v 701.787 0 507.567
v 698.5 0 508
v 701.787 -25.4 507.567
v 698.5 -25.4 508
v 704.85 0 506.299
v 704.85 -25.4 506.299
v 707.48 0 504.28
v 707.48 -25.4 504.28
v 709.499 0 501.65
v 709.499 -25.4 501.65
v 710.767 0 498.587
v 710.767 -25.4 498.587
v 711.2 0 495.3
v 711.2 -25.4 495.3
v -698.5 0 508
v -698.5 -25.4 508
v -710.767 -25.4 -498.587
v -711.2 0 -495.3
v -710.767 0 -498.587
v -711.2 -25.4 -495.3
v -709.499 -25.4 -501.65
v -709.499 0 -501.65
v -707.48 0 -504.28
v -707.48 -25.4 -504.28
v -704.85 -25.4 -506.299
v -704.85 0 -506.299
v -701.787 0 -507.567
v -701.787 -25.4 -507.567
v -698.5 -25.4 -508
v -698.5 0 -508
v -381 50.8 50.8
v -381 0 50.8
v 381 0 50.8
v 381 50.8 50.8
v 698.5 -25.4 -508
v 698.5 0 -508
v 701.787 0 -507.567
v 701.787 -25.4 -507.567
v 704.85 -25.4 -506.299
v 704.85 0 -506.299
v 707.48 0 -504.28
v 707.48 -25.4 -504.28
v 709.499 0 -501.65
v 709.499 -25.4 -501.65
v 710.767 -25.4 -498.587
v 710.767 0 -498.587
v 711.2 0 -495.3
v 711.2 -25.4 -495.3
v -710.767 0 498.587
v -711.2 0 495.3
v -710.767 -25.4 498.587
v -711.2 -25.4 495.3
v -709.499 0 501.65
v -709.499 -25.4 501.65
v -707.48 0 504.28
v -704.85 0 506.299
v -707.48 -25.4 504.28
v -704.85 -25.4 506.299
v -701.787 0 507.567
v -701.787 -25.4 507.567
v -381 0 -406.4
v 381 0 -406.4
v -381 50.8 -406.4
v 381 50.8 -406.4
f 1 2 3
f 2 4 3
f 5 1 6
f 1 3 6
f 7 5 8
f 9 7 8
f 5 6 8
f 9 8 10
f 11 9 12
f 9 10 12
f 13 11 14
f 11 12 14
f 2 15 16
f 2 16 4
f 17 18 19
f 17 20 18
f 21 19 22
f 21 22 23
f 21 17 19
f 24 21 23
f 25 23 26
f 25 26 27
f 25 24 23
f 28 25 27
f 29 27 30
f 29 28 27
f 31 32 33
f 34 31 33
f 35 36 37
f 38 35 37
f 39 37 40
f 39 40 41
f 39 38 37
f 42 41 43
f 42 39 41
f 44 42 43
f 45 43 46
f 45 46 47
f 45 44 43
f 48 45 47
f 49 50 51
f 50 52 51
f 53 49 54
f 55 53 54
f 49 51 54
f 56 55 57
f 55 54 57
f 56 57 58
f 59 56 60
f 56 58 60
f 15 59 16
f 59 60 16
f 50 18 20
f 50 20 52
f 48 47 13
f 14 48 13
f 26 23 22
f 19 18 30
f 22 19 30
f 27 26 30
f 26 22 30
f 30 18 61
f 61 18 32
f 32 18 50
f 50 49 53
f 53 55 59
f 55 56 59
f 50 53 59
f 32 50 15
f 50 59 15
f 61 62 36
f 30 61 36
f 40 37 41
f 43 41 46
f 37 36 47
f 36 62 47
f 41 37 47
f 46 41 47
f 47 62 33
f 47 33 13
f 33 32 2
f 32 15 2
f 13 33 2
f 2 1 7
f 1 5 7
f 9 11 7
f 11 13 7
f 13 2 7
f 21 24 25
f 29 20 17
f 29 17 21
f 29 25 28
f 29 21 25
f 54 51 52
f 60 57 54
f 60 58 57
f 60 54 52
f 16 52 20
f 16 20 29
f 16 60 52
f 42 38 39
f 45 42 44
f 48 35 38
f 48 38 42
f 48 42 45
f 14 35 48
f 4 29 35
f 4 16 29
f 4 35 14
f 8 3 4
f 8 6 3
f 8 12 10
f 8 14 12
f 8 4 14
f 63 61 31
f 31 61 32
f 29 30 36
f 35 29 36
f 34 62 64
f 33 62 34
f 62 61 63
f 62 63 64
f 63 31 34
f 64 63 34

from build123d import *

# Parameters (mm, degrees)
F0_W      = 762
F0_H      = 457.2
F1_DEPTH  = 50.8
F0_W_2    = 1422.4
F0_H_2    = 1016
F1_FACE_W = 762
F1_FACE_H = 457.2
F2_DEPTH  = 25.4
F3_R      = 12.7


with BuildPart() as f1:
    # F0 (on Front) → F1 (new body)
    with BuildSketch(Plane.XZ):
        with Locations((0, -177.8)):
            Rectangle(F0_W, F0_H)
    extrude(amount=-F1_DEPTH)

    # F0 (on Front) + F1_face (on face) → F2 (join)
    with BuildSketch(Plane.XZ):
        Rectangle(F0_W_2, F0_H_2)
        with Locations((0, -177.8)):
            Rectangle(F0_W, F0_H, mode=Mode.SUBTRACT)
    with BuildSketch(Plane(origin=(0, 0, -177.8), x_dir=(1, 0, 0), z_dir=(0, -1, 0))):
        Rectangle(F1_FACE_W, F1_FACE_H)
    extrude(amount=F2_DEPTH)

    # F3
    f3_edges = [f1.edges().sort_by_distance(p)[0] for p in [
        (711.2, -12.7, -508),
        (-711.2, -12.7, -508),
        (-711.2, -12.7, 508),
        (711.2, -12.7, 508),
    ]]
    fillet(f3_edges, radius=F3_R)


solid = f1.part
